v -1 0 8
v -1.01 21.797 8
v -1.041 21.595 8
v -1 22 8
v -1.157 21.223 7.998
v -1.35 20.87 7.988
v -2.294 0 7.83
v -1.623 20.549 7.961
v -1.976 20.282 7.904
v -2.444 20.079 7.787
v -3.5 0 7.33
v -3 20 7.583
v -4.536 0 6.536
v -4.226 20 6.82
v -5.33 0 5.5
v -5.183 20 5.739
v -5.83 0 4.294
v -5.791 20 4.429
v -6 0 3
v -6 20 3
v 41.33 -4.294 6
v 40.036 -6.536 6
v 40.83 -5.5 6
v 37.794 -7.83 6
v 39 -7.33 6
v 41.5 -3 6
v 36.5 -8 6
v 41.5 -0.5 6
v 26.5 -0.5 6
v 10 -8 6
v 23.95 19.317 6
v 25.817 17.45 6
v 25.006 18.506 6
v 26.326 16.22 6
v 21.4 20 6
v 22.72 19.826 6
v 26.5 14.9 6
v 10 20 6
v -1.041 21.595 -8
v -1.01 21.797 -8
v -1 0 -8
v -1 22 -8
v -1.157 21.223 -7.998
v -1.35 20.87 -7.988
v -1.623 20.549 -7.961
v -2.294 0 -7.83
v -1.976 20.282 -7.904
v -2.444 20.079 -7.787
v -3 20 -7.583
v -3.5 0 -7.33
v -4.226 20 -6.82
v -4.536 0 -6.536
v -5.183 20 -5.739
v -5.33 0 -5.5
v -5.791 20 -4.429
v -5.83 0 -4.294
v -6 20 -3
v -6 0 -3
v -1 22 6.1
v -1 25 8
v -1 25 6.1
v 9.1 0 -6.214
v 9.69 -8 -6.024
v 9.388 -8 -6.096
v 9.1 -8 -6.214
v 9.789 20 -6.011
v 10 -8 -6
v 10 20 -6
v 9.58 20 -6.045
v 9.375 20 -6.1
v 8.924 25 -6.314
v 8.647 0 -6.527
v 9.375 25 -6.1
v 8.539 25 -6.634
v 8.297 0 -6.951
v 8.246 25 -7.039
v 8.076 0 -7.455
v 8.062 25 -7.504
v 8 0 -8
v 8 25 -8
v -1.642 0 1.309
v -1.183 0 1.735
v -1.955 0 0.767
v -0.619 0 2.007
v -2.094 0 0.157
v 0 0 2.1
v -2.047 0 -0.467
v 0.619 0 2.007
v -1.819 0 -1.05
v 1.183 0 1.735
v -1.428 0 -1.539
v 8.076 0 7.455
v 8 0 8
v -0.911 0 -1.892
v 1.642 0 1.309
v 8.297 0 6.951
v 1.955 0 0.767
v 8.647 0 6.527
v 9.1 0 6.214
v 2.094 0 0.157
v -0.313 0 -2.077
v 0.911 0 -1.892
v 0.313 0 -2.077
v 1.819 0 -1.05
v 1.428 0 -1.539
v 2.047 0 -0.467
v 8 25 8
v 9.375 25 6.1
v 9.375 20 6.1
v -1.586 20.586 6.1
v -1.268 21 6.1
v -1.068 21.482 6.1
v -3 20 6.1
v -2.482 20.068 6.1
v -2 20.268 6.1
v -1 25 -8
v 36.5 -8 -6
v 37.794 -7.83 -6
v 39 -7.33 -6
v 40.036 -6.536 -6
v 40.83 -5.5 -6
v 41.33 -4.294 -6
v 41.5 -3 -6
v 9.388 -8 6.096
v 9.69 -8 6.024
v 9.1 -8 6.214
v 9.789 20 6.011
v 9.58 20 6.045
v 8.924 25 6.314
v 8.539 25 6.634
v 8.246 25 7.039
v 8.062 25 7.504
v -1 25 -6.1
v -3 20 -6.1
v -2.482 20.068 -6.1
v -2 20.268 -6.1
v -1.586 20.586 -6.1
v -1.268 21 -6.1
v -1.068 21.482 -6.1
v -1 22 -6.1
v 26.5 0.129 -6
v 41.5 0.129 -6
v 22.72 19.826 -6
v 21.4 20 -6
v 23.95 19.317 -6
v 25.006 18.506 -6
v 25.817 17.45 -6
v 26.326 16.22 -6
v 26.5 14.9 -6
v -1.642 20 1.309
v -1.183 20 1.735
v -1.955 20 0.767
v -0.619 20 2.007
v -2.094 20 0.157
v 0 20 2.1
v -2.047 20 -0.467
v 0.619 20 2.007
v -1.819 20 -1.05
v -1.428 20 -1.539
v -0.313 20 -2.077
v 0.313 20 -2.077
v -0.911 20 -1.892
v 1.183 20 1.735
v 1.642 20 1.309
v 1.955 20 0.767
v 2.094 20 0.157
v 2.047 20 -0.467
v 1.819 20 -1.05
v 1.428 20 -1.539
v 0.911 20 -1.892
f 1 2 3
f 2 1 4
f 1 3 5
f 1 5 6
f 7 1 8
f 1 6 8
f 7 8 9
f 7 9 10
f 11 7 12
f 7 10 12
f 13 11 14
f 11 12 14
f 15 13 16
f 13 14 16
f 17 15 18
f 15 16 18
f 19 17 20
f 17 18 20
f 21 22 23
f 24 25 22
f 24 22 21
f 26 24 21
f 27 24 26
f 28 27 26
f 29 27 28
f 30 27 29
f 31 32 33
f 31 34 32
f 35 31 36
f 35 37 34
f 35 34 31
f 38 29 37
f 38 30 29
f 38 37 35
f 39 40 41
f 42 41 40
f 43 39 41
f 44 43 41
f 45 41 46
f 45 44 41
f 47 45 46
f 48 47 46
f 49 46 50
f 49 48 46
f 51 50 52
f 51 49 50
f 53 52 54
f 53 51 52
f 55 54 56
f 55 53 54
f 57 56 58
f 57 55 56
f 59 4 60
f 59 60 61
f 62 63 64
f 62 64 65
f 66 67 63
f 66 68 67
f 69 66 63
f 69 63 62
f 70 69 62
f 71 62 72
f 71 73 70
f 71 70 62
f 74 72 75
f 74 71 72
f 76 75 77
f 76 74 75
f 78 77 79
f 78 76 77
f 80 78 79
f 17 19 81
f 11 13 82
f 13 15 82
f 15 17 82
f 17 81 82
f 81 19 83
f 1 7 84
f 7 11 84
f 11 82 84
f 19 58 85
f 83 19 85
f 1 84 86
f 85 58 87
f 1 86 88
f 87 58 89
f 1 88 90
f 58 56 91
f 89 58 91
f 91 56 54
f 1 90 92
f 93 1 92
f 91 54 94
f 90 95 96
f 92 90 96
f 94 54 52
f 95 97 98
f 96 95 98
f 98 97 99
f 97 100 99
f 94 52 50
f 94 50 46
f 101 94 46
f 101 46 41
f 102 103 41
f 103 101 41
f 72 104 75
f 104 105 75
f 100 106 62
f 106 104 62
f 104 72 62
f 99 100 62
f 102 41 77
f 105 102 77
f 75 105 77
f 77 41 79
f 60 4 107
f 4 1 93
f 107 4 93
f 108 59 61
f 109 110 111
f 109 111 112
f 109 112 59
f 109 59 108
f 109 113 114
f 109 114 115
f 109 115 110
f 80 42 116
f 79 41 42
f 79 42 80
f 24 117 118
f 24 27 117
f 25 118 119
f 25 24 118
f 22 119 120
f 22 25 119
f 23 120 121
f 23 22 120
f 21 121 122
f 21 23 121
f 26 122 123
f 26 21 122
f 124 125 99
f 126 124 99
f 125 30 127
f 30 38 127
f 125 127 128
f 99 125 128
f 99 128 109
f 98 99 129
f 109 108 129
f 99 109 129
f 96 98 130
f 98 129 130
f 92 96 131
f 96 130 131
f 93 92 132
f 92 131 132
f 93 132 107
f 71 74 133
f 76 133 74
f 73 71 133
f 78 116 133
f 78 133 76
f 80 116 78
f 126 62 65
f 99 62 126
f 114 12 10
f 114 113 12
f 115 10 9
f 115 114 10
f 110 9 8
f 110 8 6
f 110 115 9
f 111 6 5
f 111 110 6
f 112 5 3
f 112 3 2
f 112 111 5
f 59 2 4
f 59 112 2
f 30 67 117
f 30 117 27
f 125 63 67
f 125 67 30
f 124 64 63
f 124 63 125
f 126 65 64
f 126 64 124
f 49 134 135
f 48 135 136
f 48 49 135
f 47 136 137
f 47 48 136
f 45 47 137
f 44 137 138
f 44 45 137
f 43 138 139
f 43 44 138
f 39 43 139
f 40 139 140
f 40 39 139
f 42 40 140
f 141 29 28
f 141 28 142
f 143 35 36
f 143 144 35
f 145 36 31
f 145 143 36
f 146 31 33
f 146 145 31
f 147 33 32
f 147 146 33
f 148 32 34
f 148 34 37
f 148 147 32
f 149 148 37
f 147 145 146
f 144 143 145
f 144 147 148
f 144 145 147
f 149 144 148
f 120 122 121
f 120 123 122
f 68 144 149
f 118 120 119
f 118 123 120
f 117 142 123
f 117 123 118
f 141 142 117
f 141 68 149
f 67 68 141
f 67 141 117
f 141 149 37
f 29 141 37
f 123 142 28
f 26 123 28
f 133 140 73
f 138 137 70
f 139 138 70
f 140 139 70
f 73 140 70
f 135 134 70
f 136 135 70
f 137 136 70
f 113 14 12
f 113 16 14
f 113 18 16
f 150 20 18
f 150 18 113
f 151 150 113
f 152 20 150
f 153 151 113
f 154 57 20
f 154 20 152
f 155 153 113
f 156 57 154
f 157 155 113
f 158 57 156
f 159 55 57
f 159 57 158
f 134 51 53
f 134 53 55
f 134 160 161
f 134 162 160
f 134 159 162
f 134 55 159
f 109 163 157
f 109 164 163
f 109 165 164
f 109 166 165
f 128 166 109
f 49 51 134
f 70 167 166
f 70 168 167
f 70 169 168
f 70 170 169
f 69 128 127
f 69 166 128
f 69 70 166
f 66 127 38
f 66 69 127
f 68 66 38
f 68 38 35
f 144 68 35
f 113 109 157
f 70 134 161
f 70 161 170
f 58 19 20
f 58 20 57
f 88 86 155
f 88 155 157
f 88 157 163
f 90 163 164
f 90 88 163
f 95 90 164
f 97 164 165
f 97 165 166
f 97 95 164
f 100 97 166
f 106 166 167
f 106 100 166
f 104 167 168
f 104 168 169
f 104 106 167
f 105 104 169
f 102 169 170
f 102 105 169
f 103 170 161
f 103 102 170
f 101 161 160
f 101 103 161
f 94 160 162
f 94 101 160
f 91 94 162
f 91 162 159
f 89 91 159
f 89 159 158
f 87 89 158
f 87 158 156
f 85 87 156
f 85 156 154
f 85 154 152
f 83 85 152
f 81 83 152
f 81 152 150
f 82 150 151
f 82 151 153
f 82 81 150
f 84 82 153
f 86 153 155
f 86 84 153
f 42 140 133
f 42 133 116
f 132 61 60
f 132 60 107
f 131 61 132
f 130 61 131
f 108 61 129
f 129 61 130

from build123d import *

# Parameters (mm, degrees)
SKETCH1_W           = 12
SKETCH1_H           = 16
SKETCH1_R           = 2.1
SKETCH1_W_2         = 2
BOSS_EXTRUDE1_DEPTH = 20
FILLET1_R           = 5
SKETCH2_W           = 9
SKETCH2_H           = 1.9
BOSS_EXTRUDE2_DEPTH = 5
SKETCH4_W           = 12
SKETCH4_H           = 20
BOSS_EXTRUDE3_DEPTH = 18.5
FILLET2_R           = 5.1
SKETCH5_W           = 17.4
SKETCH5_H           = 12
BOSS_EXTRUDE4_DEPTH = 8
BOSS_EXTRUDE5_DEPTH = 15
FILLET4_R           = 5
FILLET5_R           = 2


with BuildPart() as part:
    # Sketch1 → Boss-Extrude1 (new body)
    # profile 1 of 2: a face of its own
    with BuildSketch(Plane(origin=(0, 0, 0), x_dir=(1, 0, 0), z_dir=(0, 1, 0))):
        Rectangle(SKETCH1_W, SKETCH1_H)
        with Locations(Location((0, 0, 0), (0, 0, 270))):
            Circle(SKETCH1_R, mode=Mode.SUBTRACT)
    # profile 2 of 2: a face of its own
    with BuildSketch(Plane(origin=(0, 0, 0), x_dir=(1, 0, 0), z_dir=(0, 1, 0))):
        with Locations((7, 0)):
            Rectangle(SKETCH1_W_2, SKETCH1_H)
    extrude(amount=BOSS_EXTRUDE1_DEPTH)

    # Fillet1
    fillet1_edges = [part.edges().sort_by_distance(p)[0] for p in [
        (-6, 10, 8),
        (-6, 10, -8),
    ]]
    fillet(fillet1_edges, radius=FILLET1_R)

    # Sketch2 → Boss-Extrude2 (add)
    with BuildSketch(Plane(origin=(0, 20, 0), x_dir=(1, 0, 0), z_dir=(0, 1, 0))):
        with Locations((3.5, 7.05)):
            Rectangle(SKETCH2_W, SKETCH2_H)
        with Locations((3.5, -7.05)):
            Rectangle(SKETCH2_W, SKETCH2_H)
    extrude(amount=BOSS_EXTRUDE2_DEPTH)

    # Sketch4 → Boss-Extrude3 (add)
    with BuildSketch(Plane(origin=(8, 0, 0), x_dir=(0, 0, -1), z_dir=(1, 0, 0))):
        with Locations((0, 10)):
            Rectangle(SKETCH4_W, SKETCH4_H)
    extrude(amount=BOSS_EXTRUDE3_DEPTH)

    # Fillet2
    fillet2_edges = [part.edges().sort_by_distance(p)[0] for p in [
        (26.5, 20, 0),
    ]]
    fillet(fillet2_edges, radius=FILLET2_R)

    # Sketch5 → Boss-Extrude4 (add)
    with BuildSketch(Plane.XZ):
        with Locations((17.8, 0)):
            Rectangle(SKETCH5_W, SKETCH5_H)
    extrude(amount=BOSS_EXTRUDE4_DEPTH)

    # Sketch8 → Boss-Extrude5 (add)
    with BuildSketch(Plane(origin=(26.5, 0, 0), x_dir=(0, 0, -1), z_dir=(1, 0, 0))):
        Polygon((-6, -8), (-6, -0.5), (6, 0.128893351), (6, -8), align=None)
    extrude(amount=BOSS_EXTRUDE5_DEPTH)

    # Fillet4
    fillet4_edges = [part.edges().sort_by_distance(p)[0] for p in [
        (41.5, -8, 0),
    ]]
    fillet(fillet4_edges, radius=FILLET4_R)

    # Fillet5
    fillet5_edges = [part.edges().sort_by_distance(p)[0] for p in [
        (8, 10, 6),
    ]]
    fillet(fillet5_edges, radius=FILLET5_R - 0.0001)  # a hair under: the kernel refuses the full size
    fillet5_2_edges = [part.edges().sort_by_distance(p)[0] for p in [
        (8, 10, -6),
    ]]
    fillet(fillet5_2_edges, radius=FILLET5_R - 0.0001)  # a hair under: the kernel refuses the full size
    fillet5_3_edges = [part.edges().sort_by_distance(p)[0] for p in [
        (-1, 20, -7.05),
    ]]
    fillet(fillet5_3_edges, radius=FILLET5_R)
    fillet5_4_edges = [part.edges().sort_by_distance(p)[0] for p in [
        (-1, 20, 7.05),
    ]]
    fillet(fillet5_4_edges, radius=FILLET5_R)


solid = part.part
